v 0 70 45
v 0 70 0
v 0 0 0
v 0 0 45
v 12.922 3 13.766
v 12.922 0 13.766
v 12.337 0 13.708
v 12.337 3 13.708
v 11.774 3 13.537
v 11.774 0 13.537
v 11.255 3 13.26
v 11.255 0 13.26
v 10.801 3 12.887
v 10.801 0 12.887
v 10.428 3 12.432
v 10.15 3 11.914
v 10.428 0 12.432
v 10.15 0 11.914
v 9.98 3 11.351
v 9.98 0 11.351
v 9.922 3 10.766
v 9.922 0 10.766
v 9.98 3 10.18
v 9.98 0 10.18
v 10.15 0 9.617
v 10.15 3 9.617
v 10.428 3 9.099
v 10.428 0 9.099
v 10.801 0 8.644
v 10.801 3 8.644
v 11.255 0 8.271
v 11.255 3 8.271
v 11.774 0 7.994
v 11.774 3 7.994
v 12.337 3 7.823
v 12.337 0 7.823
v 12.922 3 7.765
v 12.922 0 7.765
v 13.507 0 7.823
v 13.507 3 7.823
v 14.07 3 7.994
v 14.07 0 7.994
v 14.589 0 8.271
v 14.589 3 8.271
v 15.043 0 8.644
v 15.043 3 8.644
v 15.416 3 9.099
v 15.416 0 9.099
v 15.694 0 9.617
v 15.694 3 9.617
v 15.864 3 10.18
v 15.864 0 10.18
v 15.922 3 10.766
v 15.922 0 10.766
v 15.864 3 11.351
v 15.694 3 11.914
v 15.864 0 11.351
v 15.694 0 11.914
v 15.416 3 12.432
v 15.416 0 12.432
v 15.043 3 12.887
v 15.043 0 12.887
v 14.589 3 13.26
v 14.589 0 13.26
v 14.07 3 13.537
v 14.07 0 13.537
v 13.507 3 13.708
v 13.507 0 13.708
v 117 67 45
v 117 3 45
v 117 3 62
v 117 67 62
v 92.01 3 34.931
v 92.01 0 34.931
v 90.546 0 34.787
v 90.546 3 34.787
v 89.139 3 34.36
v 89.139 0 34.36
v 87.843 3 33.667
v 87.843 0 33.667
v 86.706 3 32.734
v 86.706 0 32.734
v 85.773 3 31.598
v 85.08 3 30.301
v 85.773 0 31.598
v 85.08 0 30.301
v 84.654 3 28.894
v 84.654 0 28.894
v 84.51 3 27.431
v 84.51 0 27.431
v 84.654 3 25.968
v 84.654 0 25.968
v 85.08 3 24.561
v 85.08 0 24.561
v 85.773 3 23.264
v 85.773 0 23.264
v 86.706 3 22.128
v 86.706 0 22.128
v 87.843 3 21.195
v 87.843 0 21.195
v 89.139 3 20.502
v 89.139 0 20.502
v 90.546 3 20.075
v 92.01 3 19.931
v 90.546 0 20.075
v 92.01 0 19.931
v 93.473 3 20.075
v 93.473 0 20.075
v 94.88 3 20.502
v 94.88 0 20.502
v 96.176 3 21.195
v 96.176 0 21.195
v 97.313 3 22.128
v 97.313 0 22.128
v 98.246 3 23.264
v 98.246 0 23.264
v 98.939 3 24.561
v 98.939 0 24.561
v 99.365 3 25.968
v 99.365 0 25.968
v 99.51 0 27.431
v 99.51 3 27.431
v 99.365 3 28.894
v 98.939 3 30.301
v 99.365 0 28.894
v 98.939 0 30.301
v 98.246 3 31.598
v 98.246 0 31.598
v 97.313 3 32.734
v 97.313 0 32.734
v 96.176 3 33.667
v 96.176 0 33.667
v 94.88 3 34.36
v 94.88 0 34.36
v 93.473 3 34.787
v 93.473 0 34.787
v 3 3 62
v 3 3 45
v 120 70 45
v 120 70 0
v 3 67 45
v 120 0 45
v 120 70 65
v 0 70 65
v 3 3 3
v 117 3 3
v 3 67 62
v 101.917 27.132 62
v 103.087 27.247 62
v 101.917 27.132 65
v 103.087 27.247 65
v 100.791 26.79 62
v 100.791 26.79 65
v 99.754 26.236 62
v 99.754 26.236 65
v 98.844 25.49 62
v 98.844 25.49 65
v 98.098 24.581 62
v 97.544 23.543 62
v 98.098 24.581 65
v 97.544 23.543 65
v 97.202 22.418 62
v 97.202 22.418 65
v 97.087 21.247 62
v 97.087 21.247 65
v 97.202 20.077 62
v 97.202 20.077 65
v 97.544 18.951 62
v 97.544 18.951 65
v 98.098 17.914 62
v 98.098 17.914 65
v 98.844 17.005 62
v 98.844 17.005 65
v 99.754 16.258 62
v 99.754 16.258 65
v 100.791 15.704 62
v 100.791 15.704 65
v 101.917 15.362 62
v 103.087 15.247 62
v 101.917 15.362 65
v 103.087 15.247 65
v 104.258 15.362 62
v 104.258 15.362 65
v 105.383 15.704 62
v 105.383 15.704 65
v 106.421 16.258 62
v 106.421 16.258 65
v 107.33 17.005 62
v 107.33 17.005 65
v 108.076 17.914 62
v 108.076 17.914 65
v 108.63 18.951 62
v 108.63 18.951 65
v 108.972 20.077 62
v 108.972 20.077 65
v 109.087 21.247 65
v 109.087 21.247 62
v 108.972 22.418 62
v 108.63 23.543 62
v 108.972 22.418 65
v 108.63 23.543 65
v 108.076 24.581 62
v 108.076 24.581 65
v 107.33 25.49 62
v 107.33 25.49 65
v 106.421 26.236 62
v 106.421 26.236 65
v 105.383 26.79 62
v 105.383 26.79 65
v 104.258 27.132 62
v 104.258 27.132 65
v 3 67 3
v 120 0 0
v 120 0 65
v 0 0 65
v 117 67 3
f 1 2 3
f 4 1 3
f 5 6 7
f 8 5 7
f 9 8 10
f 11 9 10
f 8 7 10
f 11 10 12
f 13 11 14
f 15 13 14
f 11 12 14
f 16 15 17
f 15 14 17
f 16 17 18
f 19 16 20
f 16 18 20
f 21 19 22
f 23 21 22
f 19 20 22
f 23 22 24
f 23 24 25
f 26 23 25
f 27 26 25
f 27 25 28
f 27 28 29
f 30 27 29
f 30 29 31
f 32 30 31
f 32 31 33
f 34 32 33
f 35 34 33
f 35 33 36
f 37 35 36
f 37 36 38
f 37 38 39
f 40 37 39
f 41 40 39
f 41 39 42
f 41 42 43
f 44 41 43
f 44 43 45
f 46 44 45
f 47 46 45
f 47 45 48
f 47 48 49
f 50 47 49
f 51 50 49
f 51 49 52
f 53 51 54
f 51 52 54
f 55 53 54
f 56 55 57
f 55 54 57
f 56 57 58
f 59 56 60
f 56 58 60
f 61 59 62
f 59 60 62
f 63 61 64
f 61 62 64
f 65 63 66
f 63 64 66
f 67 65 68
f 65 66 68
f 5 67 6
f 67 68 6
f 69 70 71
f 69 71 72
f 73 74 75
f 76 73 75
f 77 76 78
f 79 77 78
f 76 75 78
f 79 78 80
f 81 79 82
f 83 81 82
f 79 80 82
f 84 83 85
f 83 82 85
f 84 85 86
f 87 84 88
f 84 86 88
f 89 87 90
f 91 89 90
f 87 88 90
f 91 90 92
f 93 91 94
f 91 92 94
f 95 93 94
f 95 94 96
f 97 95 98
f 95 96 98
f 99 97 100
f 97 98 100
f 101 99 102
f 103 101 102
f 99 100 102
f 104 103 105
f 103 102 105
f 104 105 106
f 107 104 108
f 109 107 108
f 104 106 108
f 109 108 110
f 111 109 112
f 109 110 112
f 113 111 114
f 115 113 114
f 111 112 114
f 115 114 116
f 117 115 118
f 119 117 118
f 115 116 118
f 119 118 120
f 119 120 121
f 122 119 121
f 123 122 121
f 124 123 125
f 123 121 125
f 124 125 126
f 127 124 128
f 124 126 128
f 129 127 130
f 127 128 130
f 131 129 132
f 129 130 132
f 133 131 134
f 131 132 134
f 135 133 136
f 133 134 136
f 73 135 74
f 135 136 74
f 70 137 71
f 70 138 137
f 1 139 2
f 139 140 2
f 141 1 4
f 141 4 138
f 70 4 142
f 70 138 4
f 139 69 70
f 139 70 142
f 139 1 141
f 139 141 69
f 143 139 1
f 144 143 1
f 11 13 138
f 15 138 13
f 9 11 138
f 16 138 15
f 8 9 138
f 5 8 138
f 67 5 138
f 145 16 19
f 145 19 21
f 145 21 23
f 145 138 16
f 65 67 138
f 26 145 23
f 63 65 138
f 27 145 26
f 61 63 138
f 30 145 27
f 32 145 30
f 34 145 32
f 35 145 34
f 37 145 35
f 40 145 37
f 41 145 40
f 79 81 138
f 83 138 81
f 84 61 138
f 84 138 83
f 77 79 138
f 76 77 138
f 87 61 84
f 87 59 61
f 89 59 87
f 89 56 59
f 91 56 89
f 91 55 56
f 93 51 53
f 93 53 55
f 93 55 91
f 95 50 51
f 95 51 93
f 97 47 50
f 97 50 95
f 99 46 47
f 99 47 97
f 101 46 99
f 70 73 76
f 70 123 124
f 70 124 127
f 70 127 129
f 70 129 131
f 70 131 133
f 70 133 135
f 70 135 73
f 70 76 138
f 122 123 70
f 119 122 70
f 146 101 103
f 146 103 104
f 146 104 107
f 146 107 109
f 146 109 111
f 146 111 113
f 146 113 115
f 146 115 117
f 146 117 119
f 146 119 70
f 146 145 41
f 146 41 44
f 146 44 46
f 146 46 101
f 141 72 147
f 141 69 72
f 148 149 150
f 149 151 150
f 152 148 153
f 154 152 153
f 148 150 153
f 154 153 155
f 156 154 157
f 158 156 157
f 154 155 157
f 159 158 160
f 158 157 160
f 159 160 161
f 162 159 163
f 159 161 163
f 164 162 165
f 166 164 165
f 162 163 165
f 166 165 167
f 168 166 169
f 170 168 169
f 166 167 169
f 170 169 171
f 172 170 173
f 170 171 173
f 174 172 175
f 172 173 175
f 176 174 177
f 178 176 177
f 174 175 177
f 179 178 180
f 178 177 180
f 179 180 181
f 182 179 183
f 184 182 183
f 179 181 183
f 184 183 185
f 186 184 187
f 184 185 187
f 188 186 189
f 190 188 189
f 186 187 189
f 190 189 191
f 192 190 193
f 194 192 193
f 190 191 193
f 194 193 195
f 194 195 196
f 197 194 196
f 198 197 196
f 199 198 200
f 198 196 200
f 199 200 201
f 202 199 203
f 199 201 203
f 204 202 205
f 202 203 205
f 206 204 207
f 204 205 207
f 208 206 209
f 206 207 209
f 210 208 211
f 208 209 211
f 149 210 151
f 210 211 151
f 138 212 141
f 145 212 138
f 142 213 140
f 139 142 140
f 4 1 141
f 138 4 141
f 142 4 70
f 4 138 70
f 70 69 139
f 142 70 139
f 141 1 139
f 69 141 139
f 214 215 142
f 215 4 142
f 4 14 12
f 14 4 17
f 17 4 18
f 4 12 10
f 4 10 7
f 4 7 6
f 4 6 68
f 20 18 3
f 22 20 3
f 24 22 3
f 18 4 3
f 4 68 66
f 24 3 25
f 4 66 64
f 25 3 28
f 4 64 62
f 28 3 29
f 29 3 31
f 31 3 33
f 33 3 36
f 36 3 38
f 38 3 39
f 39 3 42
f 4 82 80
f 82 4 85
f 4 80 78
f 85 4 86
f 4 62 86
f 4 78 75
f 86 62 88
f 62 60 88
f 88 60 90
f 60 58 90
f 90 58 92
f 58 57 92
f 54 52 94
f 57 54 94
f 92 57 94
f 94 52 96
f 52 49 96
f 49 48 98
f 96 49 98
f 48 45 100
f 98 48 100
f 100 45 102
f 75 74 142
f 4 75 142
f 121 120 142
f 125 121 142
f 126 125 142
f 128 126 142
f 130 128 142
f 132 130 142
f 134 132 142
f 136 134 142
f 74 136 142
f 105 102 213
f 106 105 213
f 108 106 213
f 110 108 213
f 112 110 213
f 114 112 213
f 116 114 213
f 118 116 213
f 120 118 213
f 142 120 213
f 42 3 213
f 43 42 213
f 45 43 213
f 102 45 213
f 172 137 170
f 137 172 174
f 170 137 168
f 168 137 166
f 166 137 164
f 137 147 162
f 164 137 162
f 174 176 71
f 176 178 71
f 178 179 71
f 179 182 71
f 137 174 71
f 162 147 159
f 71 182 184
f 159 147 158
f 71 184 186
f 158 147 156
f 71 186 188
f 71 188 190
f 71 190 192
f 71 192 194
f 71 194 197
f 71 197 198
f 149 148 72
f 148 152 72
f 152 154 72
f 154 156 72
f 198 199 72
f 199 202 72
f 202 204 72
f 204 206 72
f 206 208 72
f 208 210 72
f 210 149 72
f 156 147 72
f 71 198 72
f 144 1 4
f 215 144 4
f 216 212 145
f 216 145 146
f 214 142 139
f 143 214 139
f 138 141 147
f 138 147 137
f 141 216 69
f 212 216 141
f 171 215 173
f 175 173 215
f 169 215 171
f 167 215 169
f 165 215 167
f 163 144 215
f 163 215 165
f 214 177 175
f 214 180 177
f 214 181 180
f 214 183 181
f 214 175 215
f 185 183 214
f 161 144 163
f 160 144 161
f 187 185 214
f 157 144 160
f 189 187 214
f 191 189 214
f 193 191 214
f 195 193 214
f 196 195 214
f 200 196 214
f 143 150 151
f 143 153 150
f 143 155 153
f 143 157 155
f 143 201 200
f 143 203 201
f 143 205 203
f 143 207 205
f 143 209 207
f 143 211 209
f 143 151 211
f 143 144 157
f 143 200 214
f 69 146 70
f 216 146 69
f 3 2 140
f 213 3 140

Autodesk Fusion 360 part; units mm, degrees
sketch "Sketch1" plane through (0, 0, 0) normal (0, 0, 1) x (1, 0, 0)
  line L0 (0, 0) -> (120, 0)
  line L1 (120, 0) -> (120, 70)
  line L2 (120, 70) -> (0, 70)
  line L3 (0, 70) -> (0, 0)
  dimension "d1" = 70
  dimension "d2" = 120
extrude "Extrude1" add sketch "Sketch1" along normal blind 65 makes body 1
shell "Shell1" thickness 3 removed faces 0 bodies 1
ref_plane "WorkPlane1" through (0, 0, 45) normal (0, 0, 1) x (1, 0, 0)
split "Split1" by plane through (0, 0, 45) normal (0, 0, 1) bodies 1 makes body 2 at (40, 46.6667, 65)
hole "Hole1" at (12.922, 3, 10.7655) direction (0, -1, 0) diameter 6 depth 20 tip angle 118 bodies 1
hole "Hole2" at (92.0095, 3, 27.4311) direction (0, -1, 0) diameter 15 depth 20 tip angle 118 bodies 1
hole "Hole3" at (103.0871, 21.2472, 62) direction (0, 0, 1) diameter 12 depth 20 tip angle 118 bodies 2
